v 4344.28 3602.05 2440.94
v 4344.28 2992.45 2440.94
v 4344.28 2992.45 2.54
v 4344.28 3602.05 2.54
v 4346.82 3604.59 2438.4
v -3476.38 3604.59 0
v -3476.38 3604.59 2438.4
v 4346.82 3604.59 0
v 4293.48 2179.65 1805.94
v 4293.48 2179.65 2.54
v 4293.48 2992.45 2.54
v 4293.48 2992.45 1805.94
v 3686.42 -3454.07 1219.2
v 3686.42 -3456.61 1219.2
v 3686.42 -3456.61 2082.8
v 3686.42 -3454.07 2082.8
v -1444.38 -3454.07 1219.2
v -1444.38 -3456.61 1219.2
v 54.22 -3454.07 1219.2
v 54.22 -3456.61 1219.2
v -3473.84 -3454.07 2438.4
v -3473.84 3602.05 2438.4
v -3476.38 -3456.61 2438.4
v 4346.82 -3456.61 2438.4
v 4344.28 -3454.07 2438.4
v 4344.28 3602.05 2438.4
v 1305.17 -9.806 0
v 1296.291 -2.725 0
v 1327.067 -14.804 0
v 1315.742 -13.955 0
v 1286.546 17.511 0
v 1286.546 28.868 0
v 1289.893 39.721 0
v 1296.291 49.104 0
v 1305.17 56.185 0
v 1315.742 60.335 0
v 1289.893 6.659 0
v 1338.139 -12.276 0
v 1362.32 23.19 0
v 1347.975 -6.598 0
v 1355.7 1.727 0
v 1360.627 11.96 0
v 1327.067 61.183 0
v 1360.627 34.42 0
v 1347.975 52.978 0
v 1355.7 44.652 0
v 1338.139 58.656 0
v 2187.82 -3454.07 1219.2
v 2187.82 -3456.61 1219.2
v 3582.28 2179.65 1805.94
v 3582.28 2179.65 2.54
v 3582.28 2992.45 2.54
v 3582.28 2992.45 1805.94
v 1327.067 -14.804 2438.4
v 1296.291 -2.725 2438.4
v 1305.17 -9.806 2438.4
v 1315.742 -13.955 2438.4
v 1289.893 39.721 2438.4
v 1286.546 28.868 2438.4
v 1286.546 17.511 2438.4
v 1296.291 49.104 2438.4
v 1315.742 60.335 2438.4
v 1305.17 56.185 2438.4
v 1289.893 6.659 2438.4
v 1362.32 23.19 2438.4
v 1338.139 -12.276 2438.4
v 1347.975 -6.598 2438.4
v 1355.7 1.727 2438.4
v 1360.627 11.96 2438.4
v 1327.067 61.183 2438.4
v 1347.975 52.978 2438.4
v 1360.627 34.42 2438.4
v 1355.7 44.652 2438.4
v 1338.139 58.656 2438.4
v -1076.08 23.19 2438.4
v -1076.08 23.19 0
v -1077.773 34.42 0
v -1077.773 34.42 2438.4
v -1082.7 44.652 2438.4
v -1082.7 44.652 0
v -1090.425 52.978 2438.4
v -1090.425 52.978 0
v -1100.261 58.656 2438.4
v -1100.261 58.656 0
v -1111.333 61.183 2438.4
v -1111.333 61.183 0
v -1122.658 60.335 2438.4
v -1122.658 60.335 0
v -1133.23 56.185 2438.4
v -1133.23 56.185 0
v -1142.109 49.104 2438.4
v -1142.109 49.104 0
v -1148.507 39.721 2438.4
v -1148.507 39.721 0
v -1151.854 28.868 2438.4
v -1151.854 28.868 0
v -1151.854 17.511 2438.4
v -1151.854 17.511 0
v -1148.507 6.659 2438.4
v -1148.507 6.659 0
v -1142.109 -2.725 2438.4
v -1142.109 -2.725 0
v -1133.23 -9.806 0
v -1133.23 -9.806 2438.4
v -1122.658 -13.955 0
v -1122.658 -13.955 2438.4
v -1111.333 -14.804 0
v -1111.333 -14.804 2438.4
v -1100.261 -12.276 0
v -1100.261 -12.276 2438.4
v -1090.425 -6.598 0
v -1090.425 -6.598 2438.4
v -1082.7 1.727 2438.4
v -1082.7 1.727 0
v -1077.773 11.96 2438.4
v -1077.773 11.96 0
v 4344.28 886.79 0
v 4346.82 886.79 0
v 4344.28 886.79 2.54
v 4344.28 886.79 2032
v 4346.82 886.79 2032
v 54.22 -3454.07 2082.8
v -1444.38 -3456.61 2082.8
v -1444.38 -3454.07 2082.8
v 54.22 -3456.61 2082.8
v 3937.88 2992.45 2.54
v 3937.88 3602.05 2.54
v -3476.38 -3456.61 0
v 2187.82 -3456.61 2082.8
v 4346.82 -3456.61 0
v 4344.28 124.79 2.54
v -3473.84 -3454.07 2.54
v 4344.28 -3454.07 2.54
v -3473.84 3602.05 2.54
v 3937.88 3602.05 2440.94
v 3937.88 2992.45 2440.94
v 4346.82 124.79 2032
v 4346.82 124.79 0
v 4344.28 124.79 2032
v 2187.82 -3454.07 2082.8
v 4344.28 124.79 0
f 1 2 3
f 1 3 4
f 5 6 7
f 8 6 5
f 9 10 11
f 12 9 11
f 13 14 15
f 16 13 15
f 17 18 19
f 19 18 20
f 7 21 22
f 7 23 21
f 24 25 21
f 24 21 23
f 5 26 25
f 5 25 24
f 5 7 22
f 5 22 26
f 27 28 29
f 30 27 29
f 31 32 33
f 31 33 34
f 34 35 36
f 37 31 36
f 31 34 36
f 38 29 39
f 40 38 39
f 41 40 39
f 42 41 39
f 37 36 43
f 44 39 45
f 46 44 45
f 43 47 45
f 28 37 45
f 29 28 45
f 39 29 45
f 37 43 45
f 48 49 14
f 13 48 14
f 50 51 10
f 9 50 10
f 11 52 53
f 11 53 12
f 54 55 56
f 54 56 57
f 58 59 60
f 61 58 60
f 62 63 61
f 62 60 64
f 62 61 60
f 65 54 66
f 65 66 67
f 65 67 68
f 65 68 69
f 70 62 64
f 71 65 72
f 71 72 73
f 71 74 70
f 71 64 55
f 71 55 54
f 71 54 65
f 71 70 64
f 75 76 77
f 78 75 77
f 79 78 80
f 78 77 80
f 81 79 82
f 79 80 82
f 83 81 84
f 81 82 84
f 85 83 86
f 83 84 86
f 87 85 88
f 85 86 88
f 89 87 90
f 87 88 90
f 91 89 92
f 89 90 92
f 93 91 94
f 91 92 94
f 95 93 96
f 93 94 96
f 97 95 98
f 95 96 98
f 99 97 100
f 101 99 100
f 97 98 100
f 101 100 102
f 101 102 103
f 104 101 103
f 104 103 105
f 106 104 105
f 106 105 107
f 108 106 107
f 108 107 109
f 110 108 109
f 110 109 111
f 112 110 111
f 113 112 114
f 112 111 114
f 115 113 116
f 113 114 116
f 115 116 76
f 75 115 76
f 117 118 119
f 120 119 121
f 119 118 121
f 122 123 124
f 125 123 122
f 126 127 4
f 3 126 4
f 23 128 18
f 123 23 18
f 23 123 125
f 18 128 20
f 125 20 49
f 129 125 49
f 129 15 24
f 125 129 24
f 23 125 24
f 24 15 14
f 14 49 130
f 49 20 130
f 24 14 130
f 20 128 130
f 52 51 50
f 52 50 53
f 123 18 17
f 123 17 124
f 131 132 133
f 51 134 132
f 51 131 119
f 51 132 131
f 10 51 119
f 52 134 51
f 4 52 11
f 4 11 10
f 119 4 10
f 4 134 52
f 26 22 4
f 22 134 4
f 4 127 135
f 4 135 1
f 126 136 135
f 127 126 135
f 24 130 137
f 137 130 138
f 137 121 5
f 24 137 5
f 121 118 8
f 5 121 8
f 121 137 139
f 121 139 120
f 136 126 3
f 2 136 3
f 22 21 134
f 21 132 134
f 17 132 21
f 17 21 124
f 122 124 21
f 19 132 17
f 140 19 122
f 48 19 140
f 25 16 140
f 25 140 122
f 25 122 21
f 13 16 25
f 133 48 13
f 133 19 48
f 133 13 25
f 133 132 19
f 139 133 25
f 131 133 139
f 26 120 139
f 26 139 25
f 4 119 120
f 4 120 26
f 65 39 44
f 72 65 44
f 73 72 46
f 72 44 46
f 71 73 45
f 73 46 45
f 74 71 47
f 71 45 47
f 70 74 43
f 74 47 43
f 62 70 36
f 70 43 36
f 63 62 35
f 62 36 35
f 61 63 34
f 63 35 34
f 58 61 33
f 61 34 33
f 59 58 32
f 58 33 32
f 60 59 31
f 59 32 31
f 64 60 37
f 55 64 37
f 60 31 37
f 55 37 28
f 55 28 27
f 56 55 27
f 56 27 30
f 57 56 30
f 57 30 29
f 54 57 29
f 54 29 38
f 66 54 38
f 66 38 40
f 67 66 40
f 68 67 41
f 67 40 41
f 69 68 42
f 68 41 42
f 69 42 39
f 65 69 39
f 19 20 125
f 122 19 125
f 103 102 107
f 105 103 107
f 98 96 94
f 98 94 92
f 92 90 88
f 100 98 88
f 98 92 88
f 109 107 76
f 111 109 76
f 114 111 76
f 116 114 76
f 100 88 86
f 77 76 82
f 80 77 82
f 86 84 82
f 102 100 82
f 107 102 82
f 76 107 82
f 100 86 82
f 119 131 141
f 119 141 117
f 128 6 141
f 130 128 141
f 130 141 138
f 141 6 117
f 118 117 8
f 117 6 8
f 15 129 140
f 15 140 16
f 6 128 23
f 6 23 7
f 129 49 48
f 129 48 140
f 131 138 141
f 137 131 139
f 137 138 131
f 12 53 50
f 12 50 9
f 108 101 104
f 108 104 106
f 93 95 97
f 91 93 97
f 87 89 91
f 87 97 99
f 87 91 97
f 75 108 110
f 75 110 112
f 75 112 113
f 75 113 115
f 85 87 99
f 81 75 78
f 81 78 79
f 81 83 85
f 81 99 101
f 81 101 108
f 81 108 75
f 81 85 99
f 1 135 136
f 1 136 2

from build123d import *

# Parameters (mm, degrees)
F0_W      = 7823.2
F0_H      = 7061.2
F1_DEPTH  = 2438.4
F2_T      = -2.54
F3_W      = 1498.6
F3_H      = 863.6
F4_DEPTH  = 2.54
F5_W      = 762
F5_H      = 2032
F6_DEPTH  = 2.54
F7_R      = 38.1
F8_DEPTH  = 2438.4
F9_W      = 406.4
F9_H      = 609.6
F10_DEPTH = 2438.4
F11_W     = 711.2
F11_H     = 812.8
F12_DEPTH = 1803.4


with BuildPart() as f1:
    # F0 (on Top) → F1 (new body)
    with BuildSketch(Plane.XY):
        with Locations((435.2199990332, 73.9898422417)):
            Rectangle(F0_W, F0_H)
    extrude(amount=F1_DEPTH)

    # F2
    f2_openings = [f1.faces().sort_by_distance(p)[0] for p in [
        (435.219999, 73.989842, 2438.4),
    ]]
    offset(amount=F2_T, openings=f2_openings)

    # F3 (on face) → F4 (cut)
    with BuildSketch(Plane.XZ.offset(3456.6101577583)):
        with Locations((-695.0800009668, 1651)):
            Rectangle(F3_W, F3_H)
        with Locations((2937.1199990332, 1651)):
            Rectangle(F3_W, F3_H)
    extrude(amount=-F4_DEPTH, mode=Mode.SUBTRACT)

    # F5 (on face) → F6 (cut)
    with BuildSketch(Plane.YZ.offset(4346.8199990332)):
        with Locations((505.7898422417, 1016)):
            Rectangle(F5_W, F5_H)
    extrude(amount=-F6_DEPTH, mode=Mode.SUBTRACT)

    # F11 (on face) → F12 (join)
    with BuildSketch(Plane.XY.offset(2.54)):
        with Locations((3937.8799990332, 2586.0498422417)):
            Rectangle(F11_W, F11_H)
    extrude(amount=F12_DEPTH)


with BuildPart() as f8:
    # F7 (on face) → F8 (new body)
    with BuildSketch(Plane.XY):
        with Locations((-1114.1800009668, 23.1898422417)):
            Circle(F7_R)
    extrude(amount=F8_DEPTH)


with BuildPart() as f8b:
    # F7 (on face) → F8, piece 2 (new body)
    with BuildSketch(Plane.XY):
        with Locations((1324.2199990332, 23.1898422417)):
            Circle(F7_R)
    extrude(amount=F8_DEPTH)


with BuildPart() as f10:
    # F9 (on face) → F10 (new body)
    with BuildSketch(Plane.XY.offset(2.54)):
        with Locations((4141.0799990332, 3297.2498422417)):
            Rectangle(F9_W, F9_H)
    extrude(amount=F10_DEPTH)


solid = Compound([f1.part, f8.part, f8b.part, f10.part])
